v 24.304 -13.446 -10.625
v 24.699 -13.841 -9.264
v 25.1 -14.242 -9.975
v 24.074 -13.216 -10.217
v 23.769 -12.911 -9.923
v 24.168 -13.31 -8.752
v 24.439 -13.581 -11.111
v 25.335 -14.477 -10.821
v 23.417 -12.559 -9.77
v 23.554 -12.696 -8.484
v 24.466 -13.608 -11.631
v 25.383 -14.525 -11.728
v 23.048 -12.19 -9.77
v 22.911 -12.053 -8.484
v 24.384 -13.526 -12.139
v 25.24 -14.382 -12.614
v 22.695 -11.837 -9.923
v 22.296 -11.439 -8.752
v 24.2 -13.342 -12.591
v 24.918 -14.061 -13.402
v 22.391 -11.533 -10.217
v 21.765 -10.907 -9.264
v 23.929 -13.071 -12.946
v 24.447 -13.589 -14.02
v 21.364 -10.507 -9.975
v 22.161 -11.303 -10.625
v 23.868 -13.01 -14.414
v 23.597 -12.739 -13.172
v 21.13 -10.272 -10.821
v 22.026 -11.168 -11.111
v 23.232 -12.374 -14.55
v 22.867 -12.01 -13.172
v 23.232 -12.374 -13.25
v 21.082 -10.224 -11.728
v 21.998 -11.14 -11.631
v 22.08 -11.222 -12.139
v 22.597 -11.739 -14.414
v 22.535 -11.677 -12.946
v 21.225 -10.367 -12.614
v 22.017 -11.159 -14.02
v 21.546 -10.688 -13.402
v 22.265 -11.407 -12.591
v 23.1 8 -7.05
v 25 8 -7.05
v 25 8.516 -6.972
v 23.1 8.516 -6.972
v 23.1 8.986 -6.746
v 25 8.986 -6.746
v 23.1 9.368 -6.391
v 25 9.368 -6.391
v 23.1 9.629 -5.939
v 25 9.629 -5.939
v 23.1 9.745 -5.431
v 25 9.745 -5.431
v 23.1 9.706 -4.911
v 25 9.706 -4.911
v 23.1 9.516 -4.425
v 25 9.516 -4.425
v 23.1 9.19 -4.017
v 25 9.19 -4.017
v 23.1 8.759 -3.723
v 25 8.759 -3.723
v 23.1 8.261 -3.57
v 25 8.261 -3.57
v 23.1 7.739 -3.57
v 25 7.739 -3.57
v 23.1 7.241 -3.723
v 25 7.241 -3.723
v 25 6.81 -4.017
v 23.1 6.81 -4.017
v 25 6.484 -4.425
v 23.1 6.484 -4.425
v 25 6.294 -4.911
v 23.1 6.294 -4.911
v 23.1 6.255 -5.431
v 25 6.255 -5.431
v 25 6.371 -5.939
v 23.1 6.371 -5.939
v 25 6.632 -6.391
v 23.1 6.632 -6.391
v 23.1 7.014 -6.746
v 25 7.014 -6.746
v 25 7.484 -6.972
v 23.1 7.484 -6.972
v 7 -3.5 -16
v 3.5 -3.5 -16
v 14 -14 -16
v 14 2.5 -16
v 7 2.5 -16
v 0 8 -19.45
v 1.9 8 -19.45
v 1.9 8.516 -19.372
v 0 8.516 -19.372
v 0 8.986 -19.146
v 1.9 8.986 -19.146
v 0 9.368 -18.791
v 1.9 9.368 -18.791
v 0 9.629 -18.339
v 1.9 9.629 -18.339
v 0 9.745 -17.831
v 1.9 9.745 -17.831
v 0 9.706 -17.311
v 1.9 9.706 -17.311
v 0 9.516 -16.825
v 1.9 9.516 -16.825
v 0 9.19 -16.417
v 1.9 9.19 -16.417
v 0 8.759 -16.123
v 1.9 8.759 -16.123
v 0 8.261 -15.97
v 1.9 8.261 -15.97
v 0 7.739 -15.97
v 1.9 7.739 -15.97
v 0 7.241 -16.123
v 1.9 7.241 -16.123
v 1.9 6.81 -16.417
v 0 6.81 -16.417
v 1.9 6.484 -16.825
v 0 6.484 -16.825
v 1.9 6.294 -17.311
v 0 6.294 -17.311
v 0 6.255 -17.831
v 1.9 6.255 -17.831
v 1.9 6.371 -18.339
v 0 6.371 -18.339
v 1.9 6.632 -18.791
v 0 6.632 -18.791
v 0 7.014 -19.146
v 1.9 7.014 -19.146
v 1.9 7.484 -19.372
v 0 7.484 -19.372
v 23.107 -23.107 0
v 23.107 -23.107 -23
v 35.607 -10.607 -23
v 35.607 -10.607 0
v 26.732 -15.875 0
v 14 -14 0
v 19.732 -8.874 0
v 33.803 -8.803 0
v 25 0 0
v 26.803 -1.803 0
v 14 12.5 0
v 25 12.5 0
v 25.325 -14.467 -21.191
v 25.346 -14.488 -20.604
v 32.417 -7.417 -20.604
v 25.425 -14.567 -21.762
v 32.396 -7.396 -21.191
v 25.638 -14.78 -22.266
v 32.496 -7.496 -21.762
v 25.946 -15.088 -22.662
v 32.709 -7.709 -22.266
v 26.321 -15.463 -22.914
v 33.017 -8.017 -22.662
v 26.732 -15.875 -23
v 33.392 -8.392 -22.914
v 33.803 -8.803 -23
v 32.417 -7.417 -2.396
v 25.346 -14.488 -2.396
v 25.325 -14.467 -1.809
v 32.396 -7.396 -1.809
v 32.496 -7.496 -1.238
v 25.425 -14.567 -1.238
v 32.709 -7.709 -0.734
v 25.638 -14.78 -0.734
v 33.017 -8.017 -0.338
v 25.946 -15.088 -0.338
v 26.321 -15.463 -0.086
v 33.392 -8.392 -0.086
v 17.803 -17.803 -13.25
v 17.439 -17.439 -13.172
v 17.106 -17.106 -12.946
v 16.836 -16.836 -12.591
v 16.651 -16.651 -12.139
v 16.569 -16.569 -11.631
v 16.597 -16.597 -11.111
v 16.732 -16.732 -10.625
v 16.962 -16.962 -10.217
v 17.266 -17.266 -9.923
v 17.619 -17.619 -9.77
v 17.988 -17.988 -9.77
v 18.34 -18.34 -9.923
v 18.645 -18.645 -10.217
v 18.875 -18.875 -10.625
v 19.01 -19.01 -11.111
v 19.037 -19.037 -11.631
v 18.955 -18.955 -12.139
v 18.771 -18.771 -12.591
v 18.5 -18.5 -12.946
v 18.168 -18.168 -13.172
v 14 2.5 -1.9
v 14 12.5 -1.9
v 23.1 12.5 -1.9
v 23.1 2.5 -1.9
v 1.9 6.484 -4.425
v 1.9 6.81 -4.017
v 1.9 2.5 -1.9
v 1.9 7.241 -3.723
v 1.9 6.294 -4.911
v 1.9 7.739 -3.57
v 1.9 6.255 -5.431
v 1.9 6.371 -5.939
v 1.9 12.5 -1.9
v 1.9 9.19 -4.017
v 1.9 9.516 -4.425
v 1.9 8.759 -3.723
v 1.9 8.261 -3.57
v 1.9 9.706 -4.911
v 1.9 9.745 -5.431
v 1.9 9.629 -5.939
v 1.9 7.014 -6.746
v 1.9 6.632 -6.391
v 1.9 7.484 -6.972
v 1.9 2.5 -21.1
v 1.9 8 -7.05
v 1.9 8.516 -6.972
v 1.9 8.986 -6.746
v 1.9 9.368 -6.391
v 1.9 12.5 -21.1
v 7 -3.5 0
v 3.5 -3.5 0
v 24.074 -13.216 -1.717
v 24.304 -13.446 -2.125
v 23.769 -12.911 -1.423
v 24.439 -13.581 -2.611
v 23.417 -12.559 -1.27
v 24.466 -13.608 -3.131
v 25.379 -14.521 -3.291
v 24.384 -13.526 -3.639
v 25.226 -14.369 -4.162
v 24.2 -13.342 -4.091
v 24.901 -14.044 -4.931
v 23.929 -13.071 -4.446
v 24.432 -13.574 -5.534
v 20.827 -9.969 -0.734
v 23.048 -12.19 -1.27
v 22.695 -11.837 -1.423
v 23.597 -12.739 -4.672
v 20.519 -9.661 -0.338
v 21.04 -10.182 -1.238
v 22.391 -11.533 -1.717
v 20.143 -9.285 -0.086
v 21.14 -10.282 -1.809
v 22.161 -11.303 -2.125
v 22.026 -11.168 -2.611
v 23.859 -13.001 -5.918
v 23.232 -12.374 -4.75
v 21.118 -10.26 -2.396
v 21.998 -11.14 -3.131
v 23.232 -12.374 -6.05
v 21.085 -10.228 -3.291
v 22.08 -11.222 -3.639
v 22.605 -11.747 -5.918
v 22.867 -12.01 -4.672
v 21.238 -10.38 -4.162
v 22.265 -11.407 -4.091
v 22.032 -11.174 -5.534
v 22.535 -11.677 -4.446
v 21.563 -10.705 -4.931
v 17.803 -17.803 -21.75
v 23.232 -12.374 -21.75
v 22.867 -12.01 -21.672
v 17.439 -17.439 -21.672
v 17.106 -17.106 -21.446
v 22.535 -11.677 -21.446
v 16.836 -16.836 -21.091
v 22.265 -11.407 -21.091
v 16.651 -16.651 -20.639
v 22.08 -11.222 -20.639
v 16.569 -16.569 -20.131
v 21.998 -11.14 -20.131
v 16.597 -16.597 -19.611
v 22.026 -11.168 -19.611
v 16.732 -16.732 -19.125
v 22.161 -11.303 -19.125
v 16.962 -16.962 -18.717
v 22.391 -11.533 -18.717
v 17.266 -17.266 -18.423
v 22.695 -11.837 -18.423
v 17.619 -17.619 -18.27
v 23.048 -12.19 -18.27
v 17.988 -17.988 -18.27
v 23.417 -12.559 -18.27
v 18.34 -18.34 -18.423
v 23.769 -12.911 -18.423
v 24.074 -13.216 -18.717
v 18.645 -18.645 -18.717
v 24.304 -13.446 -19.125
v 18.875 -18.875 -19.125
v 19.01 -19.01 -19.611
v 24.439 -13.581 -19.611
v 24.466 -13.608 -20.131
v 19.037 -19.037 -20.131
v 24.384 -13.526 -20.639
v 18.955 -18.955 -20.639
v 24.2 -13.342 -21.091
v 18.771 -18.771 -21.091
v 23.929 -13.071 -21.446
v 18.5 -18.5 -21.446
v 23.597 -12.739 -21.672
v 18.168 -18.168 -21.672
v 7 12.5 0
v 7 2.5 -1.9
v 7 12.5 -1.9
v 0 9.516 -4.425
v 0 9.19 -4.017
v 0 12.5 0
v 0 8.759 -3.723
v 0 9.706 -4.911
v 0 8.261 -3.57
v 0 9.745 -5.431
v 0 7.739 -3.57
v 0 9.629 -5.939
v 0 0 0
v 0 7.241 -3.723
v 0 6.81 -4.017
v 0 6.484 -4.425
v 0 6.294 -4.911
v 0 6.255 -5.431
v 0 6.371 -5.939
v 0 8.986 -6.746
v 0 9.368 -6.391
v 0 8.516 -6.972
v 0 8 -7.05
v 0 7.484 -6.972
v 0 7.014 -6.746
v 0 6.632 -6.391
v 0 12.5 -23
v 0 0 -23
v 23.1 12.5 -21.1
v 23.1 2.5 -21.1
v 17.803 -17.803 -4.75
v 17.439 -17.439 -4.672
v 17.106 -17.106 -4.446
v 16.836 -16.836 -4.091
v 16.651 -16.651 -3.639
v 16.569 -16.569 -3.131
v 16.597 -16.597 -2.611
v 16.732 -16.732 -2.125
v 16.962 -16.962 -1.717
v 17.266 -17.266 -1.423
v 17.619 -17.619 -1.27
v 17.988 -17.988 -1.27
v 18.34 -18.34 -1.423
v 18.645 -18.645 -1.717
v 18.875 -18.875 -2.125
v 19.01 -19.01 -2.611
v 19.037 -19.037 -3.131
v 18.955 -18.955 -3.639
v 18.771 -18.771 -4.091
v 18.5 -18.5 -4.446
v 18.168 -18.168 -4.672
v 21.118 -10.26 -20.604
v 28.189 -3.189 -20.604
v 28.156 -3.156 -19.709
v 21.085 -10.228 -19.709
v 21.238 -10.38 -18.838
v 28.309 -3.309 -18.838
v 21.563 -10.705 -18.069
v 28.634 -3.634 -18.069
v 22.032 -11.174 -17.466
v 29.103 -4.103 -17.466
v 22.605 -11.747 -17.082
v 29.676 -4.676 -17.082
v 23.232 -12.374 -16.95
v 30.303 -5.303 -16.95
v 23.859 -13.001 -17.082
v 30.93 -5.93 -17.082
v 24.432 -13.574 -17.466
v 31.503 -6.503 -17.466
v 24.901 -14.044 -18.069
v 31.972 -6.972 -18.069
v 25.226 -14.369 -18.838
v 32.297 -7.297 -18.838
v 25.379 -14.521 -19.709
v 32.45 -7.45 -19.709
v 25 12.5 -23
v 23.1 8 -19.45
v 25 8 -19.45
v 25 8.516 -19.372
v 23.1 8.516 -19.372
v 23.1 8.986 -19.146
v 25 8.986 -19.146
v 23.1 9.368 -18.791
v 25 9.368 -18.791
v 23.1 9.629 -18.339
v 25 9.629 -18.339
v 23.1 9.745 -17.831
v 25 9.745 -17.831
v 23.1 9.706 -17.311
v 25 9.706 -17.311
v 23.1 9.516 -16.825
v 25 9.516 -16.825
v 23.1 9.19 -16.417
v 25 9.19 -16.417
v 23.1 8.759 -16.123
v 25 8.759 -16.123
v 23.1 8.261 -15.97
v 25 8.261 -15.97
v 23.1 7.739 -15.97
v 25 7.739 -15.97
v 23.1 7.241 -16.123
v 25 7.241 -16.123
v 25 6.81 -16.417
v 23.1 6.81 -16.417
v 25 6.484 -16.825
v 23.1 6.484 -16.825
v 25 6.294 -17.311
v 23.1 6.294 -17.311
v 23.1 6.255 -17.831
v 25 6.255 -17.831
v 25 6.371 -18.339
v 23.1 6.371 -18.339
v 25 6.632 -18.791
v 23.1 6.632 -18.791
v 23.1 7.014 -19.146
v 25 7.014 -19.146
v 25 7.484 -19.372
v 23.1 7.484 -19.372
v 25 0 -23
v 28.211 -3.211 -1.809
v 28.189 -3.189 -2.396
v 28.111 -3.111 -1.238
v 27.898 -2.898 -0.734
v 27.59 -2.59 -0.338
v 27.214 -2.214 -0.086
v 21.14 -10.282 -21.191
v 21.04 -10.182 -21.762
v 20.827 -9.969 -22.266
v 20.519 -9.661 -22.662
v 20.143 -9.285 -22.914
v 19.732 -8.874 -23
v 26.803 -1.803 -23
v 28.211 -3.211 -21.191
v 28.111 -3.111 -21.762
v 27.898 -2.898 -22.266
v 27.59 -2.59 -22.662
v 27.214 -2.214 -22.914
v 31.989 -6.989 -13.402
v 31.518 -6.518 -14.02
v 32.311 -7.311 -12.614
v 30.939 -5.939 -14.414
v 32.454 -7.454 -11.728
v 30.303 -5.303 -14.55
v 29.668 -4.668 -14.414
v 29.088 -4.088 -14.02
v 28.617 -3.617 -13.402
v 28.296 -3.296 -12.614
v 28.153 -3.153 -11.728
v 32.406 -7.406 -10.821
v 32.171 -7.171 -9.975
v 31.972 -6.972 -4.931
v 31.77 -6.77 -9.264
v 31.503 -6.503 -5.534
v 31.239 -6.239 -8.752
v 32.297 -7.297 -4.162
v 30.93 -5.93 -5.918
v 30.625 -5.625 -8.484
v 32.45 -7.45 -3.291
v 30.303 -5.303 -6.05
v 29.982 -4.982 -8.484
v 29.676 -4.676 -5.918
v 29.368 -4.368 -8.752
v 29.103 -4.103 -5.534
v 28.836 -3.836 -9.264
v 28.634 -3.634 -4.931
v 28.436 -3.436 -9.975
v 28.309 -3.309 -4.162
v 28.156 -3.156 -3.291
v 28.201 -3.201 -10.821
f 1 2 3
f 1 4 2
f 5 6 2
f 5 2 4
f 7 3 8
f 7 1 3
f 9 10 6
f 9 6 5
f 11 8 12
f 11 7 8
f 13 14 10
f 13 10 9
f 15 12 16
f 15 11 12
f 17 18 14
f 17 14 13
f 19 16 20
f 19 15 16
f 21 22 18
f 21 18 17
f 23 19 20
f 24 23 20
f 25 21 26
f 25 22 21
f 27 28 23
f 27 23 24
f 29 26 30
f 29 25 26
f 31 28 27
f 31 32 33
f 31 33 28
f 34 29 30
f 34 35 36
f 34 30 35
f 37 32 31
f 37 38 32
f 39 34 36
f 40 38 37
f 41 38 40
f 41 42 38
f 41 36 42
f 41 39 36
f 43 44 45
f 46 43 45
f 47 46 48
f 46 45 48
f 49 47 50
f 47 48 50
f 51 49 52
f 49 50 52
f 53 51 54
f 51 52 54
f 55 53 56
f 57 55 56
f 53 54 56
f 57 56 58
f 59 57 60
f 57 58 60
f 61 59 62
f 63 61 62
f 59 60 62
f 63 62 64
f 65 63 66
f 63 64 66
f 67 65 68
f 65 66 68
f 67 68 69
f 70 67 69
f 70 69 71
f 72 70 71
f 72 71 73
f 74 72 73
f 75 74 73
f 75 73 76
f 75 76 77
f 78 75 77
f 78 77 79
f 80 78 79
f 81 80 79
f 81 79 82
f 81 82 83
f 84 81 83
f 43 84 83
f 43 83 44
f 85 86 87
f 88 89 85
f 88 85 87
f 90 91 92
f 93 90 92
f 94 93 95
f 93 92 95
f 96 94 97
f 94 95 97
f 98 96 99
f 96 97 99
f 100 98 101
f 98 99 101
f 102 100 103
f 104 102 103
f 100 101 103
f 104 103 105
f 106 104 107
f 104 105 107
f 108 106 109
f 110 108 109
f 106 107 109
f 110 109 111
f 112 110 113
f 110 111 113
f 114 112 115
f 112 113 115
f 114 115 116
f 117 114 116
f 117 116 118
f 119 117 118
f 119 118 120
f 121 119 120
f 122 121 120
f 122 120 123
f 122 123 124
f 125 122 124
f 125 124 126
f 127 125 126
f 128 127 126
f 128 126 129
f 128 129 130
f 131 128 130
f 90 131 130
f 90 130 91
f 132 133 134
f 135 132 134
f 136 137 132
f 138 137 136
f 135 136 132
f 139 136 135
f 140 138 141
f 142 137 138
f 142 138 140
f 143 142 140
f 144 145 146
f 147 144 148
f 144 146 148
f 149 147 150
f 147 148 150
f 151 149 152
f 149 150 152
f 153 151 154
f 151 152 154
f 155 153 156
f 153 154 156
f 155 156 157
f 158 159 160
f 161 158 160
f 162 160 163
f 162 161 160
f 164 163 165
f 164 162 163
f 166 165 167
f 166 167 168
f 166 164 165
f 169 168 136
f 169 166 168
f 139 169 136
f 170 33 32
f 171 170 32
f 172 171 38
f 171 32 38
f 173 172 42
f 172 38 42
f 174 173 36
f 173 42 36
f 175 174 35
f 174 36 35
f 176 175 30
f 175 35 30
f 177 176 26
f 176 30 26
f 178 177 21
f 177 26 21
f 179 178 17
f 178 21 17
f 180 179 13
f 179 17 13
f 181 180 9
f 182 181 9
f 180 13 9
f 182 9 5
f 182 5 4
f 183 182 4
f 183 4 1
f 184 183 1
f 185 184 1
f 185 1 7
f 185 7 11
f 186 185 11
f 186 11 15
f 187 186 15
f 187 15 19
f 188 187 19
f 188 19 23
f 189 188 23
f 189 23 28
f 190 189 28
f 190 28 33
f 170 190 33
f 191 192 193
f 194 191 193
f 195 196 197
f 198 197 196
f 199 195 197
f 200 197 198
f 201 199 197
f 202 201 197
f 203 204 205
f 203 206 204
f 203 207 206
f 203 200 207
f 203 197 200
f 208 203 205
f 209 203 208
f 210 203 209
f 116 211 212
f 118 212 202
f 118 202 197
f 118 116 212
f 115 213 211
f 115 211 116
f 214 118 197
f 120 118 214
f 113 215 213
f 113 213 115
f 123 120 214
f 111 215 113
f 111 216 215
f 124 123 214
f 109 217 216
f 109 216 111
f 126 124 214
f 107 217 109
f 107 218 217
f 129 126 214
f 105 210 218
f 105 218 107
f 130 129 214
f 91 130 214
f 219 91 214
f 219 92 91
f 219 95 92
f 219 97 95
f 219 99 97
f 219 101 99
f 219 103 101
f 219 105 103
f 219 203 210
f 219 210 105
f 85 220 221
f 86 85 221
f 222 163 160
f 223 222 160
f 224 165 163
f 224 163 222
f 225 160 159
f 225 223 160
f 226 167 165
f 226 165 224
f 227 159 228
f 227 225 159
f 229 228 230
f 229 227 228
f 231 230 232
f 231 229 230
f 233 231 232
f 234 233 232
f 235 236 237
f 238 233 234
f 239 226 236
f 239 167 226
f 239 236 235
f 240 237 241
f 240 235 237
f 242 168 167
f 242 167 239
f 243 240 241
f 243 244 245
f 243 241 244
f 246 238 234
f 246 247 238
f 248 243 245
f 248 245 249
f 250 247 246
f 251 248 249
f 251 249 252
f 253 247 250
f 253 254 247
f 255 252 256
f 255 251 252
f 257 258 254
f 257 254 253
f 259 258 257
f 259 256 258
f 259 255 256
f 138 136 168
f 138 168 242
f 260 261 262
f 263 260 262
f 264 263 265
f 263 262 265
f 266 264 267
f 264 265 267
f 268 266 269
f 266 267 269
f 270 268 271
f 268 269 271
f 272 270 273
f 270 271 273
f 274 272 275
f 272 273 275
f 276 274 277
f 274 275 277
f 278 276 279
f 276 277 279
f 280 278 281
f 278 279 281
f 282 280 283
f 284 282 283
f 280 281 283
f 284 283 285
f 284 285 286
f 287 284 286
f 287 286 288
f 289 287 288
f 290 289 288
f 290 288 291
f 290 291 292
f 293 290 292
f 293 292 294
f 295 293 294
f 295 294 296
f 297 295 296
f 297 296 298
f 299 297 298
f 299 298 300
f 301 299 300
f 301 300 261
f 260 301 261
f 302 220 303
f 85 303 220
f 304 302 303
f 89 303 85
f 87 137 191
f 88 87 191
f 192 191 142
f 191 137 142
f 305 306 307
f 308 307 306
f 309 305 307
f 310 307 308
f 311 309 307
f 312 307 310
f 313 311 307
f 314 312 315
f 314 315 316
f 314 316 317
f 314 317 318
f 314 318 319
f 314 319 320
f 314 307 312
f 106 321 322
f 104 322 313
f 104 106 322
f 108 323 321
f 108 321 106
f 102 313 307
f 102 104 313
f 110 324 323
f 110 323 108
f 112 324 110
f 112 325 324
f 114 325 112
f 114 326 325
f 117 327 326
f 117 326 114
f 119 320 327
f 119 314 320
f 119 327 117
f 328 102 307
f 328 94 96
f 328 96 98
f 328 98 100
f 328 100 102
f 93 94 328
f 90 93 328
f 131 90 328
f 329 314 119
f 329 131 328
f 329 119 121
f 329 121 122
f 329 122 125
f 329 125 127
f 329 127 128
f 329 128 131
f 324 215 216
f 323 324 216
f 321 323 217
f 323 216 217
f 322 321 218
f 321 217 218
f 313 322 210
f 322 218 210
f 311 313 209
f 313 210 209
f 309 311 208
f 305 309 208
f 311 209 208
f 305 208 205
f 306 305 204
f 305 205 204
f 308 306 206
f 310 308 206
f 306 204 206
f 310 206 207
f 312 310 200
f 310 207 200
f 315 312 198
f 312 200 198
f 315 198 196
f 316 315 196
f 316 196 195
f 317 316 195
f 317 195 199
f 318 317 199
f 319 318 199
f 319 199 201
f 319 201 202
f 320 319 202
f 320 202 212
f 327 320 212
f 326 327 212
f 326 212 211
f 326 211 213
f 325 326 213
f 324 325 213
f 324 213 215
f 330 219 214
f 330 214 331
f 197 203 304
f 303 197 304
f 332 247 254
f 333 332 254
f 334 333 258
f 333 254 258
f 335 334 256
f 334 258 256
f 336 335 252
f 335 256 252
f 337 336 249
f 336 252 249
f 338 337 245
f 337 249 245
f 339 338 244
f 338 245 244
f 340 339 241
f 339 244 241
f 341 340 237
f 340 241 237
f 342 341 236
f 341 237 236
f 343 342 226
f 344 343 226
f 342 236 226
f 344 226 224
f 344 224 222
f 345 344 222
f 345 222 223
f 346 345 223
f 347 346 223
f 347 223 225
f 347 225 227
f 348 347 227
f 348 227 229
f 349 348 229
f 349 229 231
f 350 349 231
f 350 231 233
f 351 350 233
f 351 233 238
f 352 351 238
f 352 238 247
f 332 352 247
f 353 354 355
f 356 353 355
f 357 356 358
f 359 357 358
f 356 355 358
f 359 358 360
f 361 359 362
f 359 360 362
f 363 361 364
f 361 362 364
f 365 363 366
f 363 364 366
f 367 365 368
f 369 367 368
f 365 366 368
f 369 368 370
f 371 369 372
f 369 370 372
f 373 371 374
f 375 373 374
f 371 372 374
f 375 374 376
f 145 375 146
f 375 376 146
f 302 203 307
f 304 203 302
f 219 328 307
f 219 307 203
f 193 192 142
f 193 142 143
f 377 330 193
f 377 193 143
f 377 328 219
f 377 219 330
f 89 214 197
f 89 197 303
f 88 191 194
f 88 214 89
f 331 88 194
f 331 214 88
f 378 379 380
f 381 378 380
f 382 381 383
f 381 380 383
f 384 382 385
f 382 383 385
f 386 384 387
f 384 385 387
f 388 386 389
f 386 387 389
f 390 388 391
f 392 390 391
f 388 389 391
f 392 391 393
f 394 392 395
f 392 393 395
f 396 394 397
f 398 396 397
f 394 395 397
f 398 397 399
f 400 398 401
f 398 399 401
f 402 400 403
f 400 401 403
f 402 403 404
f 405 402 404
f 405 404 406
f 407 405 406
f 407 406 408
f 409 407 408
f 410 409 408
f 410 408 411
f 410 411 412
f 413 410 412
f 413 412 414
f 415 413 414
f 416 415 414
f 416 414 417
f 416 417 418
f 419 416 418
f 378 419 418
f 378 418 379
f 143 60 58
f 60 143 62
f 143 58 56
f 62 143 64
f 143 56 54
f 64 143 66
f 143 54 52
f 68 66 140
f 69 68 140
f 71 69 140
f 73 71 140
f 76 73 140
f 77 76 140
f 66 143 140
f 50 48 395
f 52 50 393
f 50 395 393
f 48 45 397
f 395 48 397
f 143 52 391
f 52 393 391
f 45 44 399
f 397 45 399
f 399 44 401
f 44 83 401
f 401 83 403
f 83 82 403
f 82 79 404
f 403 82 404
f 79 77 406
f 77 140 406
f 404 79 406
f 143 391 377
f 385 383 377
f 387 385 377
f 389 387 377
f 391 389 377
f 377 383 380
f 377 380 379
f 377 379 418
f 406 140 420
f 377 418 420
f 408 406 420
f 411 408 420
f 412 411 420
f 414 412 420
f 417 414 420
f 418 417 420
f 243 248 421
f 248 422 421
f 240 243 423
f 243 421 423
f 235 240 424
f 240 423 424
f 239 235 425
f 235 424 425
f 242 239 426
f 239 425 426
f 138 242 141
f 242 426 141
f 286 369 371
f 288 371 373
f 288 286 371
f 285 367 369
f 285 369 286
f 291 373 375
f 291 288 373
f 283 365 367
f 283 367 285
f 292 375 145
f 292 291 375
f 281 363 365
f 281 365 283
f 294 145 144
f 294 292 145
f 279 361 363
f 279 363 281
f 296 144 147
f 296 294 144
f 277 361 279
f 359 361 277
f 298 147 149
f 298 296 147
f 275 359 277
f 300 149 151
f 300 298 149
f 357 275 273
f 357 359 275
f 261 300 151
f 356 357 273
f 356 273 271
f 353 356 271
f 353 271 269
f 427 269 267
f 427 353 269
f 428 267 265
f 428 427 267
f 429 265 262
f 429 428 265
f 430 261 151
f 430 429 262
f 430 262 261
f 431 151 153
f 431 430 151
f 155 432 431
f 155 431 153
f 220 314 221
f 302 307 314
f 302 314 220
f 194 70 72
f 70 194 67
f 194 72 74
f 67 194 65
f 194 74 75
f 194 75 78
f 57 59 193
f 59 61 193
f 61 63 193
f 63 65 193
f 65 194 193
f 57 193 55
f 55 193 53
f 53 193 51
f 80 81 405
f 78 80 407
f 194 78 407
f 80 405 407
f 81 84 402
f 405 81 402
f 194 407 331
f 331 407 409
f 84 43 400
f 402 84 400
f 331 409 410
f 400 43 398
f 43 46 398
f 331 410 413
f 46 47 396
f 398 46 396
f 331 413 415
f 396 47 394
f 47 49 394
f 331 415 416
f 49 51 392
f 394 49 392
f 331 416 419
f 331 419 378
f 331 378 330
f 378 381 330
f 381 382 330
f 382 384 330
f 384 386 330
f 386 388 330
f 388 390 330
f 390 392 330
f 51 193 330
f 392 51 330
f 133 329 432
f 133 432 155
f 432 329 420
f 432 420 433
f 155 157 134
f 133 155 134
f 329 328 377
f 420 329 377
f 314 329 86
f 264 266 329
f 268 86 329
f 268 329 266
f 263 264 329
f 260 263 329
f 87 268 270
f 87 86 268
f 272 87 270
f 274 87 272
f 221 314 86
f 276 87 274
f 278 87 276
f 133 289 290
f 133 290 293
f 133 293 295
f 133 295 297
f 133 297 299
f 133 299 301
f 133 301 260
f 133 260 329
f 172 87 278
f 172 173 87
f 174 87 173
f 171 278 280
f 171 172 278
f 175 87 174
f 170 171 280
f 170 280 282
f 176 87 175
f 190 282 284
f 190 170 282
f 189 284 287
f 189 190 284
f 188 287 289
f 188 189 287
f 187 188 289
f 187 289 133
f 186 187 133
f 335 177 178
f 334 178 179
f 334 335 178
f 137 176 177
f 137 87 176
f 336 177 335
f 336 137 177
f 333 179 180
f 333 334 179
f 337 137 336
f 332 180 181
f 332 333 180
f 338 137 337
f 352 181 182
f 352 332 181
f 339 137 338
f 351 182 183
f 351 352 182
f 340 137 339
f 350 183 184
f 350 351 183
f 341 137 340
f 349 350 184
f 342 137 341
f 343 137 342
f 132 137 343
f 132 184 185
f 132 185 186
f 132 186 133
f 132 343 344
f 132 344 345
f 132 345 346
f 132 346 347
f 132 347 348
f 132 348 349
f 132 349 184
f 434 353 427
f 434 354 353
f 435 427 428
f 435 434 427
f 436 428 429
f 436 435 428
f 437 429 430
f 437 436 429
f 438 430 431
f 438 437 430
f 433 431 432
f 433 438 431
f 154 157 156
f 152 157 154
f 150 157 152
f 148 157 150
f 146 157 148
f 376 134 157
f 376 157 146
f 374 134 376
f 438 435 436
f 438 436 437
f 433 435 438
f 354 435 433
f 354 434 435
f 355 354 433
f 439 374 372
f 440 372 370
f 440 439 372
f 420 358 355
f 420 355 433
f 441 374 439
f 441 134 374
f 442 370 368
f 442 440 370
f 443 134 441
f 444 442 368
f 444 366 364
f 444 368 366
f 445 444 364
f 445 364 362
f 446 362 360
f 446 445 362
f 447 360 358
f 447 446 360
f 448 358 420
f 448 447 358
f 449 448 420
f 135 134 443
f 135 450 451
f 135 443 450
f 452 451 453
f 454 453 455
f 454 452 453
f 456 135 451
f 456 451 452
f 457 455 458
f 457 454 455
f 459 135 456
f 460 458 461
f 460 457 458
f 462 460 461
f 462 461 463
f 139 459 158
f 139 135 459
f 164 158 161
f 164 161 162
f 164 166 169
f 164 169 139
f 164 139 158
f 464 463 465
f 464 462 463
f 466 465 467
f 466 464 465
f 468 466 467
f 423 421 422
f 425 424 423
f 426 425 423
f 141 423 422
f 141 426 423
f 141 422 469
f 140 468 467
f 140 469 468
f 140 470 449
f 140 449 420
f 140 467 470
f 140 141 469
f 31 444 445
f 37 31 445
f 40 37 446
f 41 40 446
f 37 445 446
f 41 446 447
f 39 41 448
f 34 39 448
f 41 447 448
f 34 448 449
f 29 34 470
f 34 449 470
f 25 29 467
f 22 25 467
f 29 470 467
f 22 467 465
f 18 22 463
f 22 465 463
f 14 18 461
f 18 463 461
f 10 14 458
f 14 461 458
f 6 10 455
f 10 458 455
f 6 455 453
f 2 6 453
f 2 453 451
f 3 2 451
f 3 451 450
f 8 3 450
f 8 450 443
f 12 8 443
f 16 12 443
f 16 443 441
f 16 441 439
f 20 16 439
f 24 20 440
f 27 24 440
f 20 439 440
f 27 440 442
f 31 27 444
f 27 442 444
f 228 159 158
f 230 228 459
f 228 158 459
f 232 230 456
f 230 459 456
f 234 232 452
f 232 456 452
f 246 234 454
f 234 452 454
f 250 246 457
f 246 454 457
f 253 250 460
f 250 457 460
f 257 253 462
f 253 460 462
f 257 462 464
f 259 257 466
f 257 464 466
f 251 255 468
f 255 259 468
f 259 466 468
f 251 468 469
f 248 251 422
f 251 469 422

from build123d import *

# Parameters (mm, degrees)
SKETCH1_W           = 25
SKETCH1_H           = 23
BOSS_EXTRUDE1_DEPTH = 12.5
SKETCH4_W           = 21.2
SKETCH4_H           = 19.2
CUT_EXTRUDE2_DEPTH  = 10
BOSS_EXTRUDE2_DEPTH = 23
SKETCH2_W           = 7
SKETCH2_H           = 16
CUT_EXTRUDE1_DEPTH  = 16
BOSS_EXTRUDE3_DEPTH = 23
SKETCH7_R           = 1.75
CUT_EXTRUDE3_DEPTH  = 35.016504294
SKETCH8_R           = 3.05
CUT_EXTRUDE8_DEPTH  = 10
FILLET1_R           = 2
CUT_EXTRUDE9_DEPTH  = 2
SKETCH11_R          = 1.75
CUT_EXTRUDE10_DEPTH = 26
CUT_EXTRUDE11_DEPTH = 14


with BuildPart() as part:
    # Sketch1 → Boss-Extrude1 (new body)
    with BuildSketch(Plane(origin=(0, 0, 0), x_dir=(1, 0, 0), z_dir=(0, 1, 0))):
        with Locations((12.5, 11.5)):
            Rectangle(SKETCH1_W, SKETCH1_H)
    extrude(amount=BOSS_EXTRUDE1_DEPTH)

    # Sketch4 → Cut-Extrude2 (cut)
    with BuildSketch(Plane(origin=(0, 12.5, 0), x_dir=(1, 0, 0), z_dir=(0, 1, 0))):
        with Locations((12.5, 11.5)):
            Rectangle(SKETCH4_W, SKETCH4_H)
    extrude(amount=-CUT_EXTRUDE2_DEPTH, mode=Mode.SUBTRACT)

    # Sketch5 → Boss-Extrude2 (add)
    with BuildSketch(Plane.XY):
        Polygon((25, 0), (12.5, -12.5), (0, 0), align=None)
    extrude(amount=-BOSS_EXTRUDE2_DEPTH)

    # Sketch2 → Cut-Extrude1 (cut)
    with BuildSketch(Plane(origin=(0, 12.5, 0), x_dir=(1, 0, 0), z_dir=(0, 1, 0))):
        with Locations((10.5, 8)):
            Rectangle(SKETCH2_W, SKETCH2_H)
    extrude(amount=-CUT_EXTRUDE1_DEPTH, mode=Mode.SUBTRACT)

    # Sketch6 → Boss-Extrude3 (add)
    with BuildSketch(Plane.XY):
        Polygon((35.606601718, -10.606601718), (25, 0), (12.5, -12.5), (23.106601718, -23.106601718), align=None)
    extrude(amount=-BOSS_EXTRUDE3_DEPTH)

    # Sketch7 → Cut-Extrude3 (cut, through all)
    with BuildSketch(Plane(origin=(12.5, 12.5, 0), x_dir=(0, 0, -1), z_dir=(0.707106781, 0.707106781, 0))):
        with Locations((20, -25.17766953)):
            Circle(SKETCH7_R)
        with Locations((3, -25.17766953)):
            Circle(SKETCH7_R)
        with Locations((11.5, -25.17766953)):
            Circle(SKETCH7_R)
    extrude(amount=-CUT_EXTRUDE3_DEPTH, mode=Mode.SUBTRACT)

    # Sketch8 → Cut-Extrude8 (cut)
    with BuildSketch(Plane(origin=(12.5, 12.5, 0), x_dir=(0, 0, -1), z_dir=(0.707106781, 0.707106781, 0))):
        with Locations((20, -25.17766953)):
            Circle(SKETCH8_R)
        with Locations((11.5, -25.17766953)):
            Circle(SKETCH8_R)
        with Locations((3, -25.17766953)):
            Circle(SKETCH8_R)
    extrude(amount=-CUT_EXTRUDE8_DEPTH, mode=Mode.SUBTRACT)

    # Fillet1
    fillet1_edges = [part.edges().sort_by_distance(p)[0] for p in [
        (26.378858223, -8.449926035, 0),
        (27.156675683, -9.227743494, 0),
        (27.156675683, -9.227743494, -23),
        (26.378858223, -8.449926035, -23),
    ]]
    fillet(fillet1_edges, radius=FILLET1_R)

    # Sketch9 → Cut-Extrude9 (cut)
    with BuildSketch(Plane.XY):
        Polygon((7, -7), (14, -14), (14, -3.5), (7, -3.5), (3.5, -3.5), align=None)
    extrude(amount=-CUT_EXTRUDE9_DEPTH, mode=Mode.SUBTRACT)

    # Sketch11 → Cut-Extrude10 (cut, through all)
    with BuildSketch(Plane(origin=(25, 0, 0), x_dir=(0, 0, -1), z_dir=(1, 0, 0))):
        with Locations((5.3, 8)):
            Circle(SKETCH11_R)
        with Locations((17.7, 8)):
            Circle(SKETCH11_R)
    extrude(amount=-CUT_EXTRUDE10_DEPTH, mode=Mode.SUBTRACT)

    # Sketch12 → Cut-Extrude11 (cut)
    with BuildSketch(Plane.XY.offset(-2)):
        Polygon((3.5, -3.5), (14, -3.5), (14, -14), align=None)
    extrude(amount=-CUT_EXTRUDE11_DEPTH, mode=Mode.SUBTRACT)


solid = part.part
